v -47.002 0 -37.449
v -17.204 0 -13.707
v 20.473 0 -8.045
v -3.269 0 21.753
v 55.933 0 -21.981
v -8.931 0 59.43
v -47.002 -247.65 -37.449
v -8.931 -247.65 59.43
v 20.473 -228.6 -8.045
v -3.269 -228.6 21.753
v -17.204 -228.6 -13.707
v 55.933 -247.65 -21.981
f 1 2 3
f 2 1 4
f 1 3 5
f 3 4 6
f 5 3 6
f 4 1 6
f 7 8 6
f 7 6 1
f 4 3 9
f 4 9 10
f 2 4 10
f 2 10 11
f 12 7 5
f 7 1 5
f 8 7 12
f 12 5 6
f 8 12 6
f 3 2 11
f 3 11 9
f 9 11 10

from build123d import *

# Parameters (mm, degrees)
F1_DEPTH = 228.6
F2_T     = 19.05


with BuildPart() as f1:
    # F0 (on Front) → F1 (new body)
    with BuildSketch(Plane.XZ):
        Polygon((20.4729149157, -8.0454803992), (-3.2688670465, 21.7528046061), (-17.2040478692, -13.7073242069), align=None)
    extrude(amount=F1_DEPTH)

    # F2
    f2_openings = [f1.faces().sort_by_distance(p)[0] for p in [
        (0, 0, 0),
    ]]
    offset(amount=F2_T, openings=f2_openings, kind=Kind.INTERSECTION)


solid = f1.part
